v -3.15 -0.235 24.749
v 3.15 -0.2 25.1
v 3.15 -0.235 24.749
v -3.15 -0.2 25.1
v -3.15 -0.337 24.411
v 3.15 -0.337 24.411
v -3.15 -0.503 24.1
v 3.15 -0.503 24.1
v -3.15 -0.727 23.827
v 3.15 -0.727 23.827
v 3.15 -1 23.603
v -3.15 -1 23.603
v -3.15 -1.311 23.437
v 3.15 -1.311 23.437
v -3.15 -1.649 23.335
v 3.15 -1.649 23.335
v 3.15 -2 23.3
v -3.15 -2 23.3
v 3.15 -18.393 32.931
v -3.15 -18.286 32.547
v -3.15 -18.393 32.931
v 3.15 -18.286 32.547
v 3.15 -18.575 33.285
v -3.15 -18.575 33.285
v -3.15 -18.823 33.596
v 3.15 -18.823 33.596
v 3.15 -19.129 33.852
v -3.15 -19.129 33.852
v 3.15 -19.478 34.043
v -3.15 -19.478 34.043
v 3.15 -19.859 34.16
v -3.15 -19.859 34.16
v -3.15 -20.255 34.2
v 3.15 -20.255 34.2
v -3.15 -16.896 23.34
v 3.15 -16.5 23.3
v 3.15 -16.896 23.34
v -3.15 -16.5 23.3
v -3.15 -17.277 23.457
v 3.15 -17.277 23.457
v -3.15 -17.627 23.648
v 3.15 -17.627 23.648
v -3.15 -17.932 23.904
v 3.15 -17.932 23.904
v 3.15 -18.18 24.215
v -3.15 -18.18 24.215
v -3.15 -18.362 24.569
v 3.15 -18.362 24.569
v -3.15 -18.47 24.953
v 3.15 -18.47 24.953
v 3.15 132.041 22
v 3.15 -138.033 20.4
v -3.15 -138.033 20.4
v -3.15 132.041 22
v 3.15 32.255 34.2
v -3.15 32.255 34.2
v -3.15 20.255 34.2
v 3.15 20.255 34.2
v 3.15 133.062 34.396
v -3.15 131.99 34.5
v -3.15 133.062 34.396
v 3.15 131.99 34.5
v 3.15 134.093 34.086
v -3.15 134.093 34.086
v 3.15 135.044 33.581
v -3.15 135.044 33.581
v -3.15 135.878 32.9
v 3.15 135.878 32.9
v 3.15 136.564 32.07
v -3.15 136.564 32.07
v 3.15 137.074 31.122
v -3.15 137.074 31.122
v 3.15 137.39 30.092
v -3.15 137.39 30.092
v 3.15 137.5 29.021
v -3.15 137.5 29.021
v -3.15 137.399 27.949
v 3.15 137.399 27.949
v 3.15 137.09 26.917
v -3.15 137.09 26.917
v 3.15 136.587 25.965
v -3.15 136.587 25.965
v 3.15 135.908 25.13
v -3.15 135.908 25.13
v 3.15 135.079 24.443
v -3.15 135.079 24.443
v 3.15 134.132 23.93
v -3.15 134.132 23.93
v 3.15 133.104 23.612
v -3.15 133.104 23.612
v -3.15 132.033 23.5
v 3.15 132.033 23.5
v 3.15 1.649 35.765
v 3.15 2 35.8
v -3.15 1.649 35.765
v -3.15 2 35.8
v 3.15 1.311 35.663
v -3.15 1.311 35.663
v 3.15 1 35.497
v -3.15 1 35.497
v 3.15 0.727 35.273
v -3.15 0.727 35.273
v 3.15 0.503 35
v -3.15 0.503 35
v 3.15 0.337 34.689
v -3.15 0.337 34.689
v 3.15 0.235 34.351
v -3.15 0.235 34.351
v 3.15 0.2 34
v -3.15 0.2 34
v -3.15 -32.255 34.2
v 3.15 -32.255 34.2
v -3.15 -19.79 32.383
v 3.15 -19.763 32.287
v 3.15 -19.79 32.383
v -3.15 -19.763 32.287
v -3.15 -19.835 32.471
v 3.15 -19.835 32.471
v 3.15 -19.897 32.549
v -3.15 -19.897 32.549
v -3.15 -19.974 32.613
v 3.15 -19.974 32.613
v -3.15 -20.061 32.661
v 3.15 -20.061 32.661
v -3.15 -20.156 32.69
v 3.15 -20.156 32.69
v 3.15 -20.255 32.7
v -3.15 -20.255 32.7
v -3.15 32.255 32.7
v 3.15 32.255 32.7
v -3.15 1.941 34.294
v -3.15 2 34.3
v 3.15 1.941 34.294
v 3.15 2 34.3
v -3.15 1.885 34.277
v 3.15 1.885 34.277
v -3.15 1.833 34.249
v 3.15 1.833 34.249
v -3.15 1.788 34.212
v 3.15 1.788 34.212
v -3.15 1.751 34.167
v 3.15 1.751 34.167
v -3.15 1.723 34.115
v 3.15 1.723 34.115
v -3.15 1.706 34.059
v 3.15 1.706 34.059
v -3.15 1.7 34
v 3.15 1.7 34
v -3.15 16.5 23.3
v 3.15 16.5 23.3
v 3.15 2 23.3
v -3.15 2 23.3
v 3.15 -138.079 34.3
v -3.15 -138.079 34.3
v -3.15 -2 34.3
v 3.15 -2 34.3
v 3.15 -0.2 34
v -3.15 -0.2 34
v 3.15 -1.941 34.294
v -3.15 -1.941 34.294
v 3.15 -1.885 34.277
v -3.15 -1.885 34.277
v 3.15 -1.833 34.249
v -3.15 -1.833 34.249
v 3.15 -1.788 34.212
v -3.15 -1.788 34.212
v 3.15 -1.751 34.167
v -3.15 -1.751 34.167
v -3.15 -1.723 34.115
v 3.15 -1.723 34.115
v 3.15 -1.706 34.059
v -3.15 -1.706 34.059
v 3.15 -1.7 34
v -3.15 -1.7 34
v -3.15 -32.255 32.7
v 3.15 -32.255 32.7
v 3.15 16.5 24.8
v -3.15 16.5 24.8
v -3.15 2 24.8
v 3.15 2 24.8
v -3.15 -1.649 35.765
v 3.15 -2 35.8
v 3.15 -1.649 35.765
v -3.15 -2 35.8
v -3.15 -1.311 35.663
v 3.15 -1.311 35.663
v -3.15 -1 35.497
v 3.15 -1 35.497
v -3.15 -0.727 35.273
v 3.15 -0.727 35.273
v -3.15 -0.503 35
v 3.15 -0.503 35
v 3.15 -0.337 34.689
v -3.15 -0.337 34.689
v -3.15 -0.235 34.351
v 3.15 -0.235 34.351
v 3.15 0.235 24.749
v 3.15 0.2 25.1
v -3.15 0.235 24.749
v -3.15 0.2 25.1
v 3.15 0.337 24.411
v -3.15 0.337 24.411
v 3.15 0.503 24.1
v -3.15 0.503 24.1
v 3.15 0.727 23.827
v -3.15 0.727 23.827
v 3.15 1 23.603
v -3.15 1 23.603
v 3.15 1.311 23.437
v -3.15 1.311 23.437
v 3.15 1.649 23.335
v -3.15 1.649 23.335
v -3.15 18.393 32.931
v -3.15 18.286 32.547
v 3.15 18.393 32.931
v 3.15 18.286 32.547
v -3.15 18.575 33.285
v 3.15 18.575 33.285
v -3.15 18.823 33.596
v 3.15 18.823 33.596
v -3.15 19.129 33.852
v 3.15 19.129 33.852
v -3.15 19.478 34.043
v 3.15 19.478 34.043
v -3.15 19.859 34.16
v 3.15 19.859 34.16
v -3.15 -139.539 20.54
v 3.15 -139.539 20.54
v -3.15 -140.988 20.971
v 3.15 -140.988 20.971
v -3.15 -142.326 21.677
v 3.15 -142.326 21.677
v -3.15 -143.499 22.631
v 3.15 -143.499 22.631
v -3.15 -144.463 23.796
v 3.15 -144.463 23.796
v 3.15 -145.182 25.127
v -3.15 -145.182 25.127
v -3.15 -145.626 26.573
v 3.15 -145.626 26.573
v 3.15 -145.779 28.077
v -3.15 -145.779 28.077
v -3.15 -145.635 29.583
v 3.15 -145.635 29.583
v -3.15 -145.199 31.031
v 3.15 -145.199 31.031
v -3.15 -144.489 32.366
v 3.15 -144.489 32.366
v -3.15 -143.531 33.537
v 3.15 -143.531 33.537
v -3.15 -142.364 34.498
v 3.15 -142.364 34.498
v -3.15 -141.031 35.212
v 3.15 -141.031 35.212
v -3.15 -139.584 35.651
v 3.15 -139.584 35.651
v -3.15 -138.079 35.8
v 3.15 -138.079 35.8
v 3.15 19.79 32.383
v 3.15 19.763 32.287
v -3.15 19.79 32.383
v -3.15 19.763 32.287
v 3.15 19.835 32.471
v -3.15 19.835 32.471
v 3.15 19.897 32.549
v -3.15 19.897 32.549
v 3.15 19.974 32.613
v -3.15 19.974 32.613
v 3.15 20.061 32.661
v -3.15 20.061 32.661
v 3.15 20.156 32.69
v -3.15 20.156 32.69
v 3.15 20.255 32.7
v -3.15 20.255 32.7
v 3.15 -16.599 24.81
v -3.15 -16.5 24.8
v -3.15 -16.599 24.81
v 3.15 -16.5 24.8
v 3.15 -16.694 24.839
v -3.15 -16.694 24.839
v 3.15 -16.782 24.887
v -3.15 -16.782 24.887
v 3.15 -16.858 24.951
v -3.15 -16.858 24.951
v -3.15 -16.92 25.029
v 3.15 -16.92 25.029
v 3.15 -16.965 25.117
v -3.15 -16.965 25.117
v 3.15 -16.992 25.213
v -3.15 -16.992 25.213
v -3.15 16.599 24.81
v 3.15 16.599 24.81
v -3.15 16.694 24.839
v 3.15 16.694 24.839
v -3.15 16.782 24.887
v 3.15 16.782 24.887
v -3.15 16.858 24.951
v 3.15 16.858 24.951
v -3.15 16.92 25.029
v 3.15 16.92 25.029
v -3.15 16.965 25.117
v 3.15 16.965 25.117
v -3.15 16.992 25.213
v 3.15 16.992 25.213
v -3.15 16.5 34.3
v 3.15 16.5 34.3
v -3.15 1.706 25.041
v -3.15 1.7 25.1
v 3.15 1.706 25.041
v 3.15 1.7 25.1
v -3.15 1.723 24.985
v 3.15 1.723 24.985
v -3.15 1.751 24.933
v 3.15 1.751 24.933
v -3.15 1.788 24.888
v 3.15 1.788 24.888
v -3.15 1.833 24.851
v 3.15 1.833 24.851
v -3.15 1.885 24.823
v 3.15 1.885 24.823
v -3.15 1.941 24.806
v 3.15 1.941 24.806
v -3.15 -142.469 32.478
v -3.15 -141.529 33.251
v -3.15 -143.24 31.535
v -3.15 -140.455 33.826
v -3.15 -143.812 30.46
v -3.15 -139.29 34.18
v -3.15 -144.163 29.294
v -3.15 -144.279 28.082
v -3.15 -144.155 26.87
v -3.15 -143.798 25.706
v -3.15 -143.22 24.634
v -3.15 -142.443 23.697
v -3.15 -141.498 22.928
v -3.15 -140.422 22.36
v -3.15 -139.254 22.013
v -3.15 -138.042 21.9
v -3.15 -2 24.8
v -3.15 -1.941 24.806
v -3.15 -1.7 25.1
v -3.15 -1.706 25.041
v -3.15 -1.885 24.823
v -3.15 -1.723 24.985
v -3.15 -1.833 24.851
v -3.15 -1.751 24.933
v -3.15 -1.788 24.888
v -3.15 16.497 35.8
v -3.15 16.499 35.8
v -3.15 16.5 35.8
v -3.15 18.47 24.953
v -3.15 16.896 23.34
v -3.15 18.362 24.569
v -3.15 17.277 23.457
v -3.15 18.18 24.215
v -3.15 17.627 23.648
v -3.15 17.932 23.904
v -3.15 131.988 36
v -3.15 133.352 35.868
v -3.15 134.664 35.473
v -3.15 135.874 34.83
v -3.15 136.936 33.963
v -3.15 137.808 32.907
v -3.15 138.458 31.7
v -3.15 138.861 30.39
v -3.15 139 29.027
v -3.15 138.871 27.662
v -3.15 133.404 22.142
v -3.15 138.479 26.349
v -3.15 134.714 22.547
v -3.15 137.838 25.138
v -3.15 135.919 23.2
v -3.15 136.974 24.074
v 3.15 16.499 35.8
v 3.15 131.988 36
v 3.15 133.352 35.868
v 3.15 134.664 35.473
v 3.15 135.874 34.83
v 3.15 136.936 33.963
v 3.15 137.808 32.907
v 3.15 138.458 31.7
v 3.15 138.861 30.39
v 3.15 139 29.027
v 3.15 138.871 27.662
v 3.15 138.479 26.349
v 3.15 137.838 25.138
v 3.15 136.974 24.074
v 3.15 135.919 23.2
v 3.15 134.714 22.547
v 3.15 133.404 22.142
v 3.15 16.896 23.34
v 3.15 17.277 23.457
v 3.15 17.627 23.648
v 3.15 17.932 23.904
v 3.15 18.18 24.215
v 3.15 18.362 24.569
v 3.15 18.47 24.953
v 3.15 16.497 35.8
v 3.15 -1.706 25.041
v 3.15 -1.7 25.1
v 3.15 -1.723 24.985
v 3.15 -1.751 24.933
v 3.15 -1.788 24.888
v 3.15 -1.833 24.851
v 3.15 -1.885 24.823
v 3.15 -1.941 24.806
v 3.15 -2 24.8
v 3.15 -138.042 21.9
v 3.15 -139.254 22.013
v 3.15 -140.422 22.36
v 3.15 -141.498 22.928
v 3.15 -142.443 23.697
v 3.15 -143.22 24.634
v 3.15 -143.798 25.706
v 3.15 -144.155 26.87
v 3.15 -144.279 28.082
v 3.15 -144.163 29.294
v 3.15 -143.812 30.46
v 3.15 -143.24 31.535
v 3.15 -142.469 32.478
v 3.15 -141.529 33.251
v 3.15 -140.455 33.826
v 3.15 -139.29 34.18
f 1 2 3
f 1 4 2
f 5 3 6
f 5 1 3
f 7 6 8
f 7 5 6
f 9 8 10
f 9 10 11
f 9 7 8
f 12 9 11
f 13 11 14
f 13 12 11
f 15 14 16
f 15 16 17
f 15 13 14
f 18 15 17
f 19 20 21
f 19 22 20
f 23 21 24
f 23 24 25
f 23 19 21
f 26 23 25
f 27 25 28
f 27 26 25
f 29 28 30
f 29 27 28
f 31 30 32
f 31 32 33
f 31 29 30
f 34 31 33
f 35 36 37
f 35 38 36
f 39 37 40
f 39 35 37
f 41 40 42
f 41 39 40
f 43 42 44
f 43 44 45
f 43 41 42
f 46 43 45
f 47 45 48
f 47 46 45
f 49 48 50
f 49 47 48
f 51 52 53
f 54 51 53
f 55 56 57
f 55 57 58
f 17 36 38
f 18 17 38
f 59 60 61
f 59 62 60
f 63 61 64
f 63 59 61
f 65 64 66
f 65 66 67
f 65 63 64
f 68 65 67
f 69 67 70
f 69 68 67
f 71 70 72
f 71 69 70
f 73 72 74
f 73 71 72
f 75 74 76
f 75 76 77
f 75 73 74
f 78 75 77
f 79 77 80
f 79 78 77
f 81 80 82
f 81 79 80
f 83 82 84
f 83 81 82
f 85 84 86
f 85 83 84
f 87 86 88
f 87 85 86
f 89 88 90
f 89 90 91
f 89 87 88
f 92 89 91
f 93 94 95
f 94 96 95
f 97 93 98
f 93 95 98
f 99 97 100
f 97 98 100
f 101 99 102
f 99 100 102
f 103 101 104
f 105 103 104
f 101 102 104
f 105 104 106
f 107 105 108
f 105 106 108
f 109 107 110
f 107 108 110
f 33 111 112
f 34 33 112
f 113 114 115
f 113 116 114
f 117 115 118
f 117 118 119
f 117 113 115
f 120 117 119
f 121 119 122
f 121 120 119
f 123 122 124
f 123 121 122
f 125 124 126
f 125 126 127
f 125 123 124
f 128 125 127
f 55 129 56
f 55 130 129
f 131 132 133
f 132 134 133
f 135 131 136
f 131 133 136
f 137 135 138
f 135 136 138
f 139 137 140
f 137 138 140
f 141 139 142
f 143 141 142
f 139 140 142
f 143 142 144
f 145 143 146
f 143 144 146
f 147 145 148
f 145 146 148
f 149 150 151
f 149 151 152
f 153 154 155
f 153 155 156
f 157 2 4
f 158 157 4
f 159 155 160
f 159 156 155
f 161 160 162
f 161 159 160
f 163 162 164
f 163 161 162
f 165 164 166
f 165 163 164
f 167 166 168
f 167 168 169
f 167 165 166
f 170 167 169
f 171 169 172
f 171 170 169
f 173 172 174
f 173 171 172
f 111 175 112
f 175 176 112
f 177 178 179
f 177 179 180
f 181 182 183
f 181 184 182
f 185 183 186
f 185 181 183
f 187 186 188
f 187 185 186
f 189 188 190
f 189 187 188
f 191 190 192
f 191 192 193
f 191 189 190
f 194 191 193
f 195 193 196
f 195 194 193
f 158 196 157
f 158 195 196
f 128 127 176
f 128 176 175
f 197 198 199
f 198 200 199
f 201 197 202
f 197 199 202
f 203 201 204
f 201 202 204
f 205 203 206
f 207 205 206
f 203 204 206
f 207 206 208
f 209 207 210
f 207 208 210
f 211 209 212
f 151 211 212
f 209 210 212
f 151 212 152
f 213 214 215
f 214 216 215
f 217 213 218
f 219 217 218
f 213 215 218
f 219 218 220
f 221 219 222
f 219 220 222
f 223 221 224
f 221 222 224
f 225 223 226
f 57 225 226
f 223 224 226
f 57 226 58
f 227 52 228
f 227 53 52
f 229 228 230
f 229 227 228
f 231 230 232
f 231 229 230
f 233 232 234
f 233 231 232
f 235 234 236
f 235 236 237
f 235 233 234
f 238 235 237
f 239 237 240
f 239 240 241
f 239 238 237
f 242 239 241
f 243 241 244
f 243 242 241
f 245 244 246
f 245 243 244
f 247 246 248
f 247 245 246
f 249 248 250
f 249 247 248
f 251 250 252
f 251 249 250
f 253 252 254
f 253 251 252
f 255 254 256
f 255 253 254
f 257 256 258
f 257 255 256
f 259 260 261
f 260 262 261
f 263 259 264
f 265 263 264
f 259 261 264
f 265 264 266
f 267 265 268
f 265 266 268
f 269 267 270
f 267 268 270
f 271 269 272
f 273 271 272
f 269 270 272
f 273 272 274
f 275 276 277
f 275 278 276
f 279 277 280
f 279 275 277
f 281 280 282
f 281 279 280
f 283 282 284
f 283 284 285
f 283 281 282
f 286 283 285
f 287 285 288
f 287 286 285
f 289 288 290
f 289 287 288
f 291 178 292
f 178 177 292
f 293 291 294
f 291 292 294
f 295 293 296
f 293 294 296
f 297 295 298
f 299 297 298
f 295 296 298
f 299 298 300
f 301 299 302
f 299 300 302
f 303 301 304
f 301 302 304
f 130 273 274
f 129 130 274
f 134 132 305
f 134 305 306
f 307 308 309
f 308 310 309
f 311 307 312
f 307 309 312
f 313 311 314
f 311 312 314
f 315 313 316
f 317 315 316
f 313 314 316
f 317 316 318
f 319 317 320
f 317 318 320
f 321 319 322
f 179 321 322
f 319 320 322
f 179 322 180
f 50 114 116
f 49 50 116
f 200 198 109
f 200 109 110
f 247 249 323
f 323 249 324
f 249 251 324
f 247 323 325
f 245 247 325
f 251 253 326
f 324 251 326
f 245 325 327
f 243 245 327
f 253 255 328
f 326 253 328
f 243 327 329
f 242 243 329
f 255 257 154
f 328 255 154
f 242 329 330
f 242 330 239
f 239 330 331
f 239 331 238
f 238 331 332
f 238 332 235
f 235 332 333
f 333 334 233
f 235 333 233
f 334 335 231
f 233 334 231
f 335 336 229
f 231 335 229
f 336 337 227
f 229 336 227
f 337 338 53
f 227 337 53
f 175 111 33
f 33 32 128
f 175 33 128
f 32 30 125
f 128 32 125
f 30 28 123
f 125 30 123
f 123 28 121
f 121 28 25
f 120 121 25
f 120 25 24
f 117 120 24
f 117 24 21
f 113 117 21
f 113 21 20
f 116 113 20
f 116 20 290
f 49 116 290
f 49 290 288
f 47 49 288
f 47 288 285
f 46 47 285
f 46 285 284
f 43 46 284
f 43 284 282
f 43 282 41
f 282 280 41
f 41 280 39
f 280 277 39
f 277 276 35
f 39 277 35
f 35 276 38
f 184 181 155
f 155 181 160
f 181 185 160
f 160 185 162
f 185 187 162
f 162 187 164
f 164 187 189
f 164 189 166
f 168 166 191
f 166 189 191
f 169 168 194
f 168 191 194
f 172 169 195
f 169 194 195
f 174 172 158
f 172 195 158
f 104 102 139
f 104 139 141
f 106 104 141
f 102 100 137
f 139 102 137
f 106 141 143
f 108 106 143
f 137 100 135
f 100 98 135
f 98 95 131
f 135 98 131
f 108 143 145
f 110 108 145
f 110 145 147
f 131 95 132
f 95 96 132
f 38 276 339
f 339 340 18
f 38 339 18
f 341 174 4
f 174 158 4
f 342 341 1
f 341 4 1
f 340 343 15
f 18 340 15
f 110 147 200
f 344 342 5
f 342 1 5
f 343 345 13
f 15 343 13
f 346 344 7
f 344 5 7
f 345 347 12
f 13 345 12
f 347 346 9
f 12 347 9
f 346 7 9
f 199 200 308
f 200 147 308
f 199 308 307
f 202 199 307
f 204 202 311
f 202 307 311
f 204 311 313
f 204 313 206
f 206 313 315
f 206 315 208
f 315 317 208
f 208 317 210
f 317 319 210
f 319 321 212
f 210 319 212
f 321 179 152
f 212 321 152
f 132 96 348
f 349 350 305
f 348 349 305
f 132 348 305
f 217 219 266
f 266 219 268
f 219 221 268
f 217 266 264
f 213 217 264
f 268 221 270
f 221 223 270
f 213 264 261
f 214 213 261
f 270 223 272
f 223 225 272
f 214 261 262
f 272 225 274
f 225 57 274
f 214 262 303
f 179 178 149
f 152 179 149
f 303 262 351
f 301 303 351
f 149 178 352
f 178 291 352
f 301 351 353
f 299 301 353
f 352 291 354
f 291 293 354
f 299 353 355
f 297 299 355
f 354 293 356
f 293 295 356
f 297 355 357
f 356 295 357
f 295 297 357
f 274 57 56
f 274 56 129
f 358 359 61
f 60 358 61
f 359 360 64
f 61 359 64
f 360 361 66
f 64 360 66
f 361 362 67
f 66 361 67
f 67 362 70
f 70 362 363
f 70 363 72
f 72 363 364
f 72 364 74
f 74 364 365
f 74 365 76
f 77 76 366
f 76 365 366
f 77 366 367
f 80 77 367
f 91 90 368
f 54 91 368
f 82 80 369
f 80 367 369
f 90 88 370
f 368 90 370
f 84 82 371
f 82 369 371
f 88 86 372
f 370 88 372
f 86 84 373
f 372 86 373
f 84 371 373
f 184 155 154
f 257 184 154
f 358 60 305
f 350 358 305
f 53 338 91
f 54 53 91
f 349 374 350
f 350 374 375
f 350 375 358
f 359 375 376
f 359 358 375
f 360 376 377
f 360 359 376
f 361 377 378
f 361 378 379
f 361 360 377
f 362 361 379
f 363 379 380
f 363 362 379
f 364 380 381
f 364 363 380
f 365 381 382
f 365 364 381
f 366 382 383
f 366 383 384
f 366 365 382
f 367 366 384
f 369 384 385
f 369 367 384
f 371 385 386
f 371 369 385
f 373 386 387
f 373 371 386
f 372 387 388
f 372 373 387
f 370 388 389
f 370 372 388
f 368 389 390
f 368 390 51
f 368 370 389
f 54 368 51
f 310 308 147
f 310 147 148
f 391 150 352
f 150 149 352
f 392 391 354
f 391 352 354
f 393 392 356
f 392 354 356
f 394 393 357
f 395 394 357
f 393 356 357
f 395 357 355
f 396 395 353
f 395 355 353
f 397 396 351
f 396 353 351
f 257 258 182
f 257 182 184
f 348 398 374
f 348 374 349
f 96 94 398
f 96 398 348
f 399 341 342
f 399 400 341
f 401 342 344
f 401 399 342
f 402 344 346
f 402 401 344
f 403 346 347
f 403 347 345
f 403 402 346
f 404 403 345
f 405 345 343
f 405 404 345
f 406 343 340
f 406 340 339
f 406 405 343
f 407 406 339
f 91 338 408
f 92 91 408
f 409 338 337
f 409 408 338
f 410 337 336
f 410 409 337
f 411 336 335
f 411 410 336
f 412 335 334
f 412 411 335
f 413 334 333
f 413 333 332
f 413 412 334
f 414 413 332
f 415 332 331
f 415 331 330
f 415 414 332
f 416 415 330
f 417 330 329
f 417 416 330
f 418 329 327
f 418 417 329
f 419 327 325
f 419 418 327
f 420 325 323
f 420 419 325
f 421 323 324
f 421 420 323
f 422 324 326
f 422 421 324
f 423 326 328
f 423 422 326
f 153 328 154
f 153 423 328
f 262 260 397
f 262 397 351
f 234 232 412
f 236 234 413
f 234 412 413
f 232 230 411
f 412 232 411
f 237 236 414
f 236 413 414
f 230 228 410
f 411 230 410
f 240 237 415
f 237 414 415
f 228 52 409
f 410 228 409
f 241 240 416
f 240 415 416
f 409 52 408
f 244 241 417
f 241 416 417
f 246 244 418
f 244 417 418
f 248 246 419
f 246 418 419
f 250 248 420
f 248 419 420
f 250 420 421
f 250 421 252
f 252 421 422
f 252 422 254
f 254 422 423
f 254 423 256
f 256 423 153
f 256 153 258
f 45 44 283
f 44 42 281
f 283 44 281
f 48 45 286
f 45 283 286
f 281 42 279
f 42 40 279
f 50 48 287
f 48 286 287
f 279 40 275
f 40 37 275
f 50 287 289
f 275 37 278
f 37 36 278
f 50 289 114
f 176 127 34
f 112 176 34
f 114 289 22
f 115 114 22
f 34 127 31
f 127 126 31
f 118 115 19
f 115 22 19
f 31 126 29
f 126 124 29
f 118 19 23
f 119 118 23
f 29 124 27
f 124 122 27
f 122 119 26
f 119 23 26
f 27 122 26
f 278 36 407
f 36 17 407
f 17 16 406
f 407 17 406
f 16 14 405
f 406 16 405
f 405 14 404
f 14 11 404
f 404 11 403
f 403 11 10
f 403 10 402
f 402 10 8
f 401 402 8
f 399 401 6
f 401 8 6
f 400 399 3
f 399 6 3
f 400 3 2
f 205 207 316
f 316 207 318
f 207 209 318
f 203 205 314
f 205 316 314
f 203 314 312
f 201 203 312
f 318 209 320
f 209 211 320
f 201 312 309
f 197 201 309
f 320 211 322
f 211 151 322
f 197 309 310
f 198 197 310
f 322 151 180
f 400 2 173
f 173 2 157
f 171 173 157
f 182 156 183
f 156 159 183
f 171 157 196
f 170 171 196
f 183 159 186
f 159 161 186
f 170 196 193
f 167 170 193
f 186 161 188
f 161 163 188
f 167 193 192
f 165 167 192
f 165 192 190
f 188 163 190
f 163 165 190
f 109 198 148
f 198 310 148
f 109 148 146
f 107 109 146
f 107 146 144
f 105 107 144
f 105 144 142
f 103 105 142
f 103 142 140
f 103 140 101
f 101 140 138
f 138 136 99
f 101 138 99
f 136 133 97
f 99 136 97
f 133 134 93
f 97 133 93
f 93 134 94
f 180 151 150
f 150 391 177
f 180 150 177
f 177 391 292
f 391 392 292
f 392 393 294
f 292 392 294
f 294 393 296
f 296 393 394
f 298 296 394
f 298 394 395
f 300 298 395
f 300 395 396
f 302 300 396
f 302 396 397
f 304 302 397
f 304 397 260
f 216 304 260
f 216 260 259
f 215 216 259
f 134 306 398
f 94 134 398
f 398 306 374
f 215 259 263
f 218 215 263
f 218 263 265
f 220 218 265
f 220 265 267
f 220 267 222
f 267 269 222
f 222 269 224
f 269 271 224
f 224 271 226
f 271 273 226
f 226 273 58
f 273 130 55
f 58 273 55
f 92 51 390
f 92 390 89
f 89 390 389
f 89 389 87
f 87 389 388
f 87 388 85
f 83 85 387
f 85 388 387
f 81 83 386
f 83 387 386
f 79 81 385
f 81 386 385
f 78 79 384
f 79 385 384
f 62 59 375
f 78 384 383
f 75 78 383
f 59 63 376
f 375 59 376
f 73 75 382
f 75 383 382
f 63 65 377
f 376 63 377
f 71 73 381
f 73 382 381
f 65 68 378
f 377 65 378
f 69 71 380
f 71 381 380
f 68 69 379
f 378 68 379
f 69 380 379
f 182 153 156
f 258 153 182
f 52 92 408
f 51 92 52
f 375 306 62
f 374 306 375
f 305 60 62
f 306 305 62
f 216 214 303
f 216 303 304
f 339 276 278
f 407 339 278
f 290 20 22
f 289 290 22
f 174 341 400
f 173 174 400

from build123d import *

# Parameters (mm, degrees)
SKETCH001_W = 6.3
SKETCH001_H = 1.5


with BuildPart() as y_belt_seg2:
    # Sweep001: sweep along a path in Sketch002
    with BuildLine(Plane.YZ) as sweep001_path:
        Line((-16.5, 34.3), (-2, 34.3))
        ThreePointArc((-2, 34.3), (-1.787868, 34.212132), (-1.7, 34))
        Line((-1.7, 34), (-1.7, 25.1))
        ThreePointArc((-1.7, 25.1), (-1.787868, 24.887868), (-2, 24.8))
        Line((-2, 24.8), (-16.5, 24.8))
        ThreePointArc((-16.5, 24.8), (-16.821394, 24.916978), (-16.992404, 25.213176))
        Line((-16.992404, 25.213176), (-18.285606, 32.547297))
        ThreePointArc((-18.285606, 32.547297), (-18.969647, 33.732089), (-20.255221, 34.2))
        Line((-20.255221, 34.2), (-32.255221, 34.2))
    # Sketch001 → Sweep001 (sweep)
    with BuildSketch(Plane(origin=(0, -16.5, 35.05), x_dir=(1, 0, 0), z_dir=(0, -1, 0))):
        Rectangle(SKETCH001_W, SKETCH001_H)
    sweep(path=sweep001_path.line)


with BuildPart() as part_mirroring:
    # Part__Mirroring: instance of y-belt-seg2
    add(y_belt_seg2.part.mirror(Plane(origin=(0, 0, 0), x_dir=(1, 0, 0), z_dir=(0, 1, 0))))


with BuildPart() as y_belt:
    # Sweep: sweep along a path in Sketch
    with BuildLine(Plane.YZ) as sweep_path:
        Line((16.5, 34.3), (131.990476, 34.499992))
        ThreePointArc((131.990476, 34.499992), (137.49996, 29.021053), (132.032583, 23.500097))
        Line((132.032583, 23.500097), (-138.041883, 21.900109))
        ThreePointArc((-138.041883, 21.900109), (-144.278585, 28.081635), (-138.078613, 34.3))
        Line((-138.078613, 34.3), (-16.5, 34.3))
    # Sketch001 → Sweep (sweep)
    with BuildSketch(Plane(origin=(0, -16.5, 35.05), x_dir=(1, 0, 0), z_dir=(0, -1, 0))):
        Rectangle(SKETCH001_W, SKETCH001_H)
    sweep(path=sweep_path.line)

    # Fusion: union Part__Mirroring, y-belt-seg2
    add(part_mirroring.part)
    add(y_belt_seg2.part)


solid = y_belt.part
